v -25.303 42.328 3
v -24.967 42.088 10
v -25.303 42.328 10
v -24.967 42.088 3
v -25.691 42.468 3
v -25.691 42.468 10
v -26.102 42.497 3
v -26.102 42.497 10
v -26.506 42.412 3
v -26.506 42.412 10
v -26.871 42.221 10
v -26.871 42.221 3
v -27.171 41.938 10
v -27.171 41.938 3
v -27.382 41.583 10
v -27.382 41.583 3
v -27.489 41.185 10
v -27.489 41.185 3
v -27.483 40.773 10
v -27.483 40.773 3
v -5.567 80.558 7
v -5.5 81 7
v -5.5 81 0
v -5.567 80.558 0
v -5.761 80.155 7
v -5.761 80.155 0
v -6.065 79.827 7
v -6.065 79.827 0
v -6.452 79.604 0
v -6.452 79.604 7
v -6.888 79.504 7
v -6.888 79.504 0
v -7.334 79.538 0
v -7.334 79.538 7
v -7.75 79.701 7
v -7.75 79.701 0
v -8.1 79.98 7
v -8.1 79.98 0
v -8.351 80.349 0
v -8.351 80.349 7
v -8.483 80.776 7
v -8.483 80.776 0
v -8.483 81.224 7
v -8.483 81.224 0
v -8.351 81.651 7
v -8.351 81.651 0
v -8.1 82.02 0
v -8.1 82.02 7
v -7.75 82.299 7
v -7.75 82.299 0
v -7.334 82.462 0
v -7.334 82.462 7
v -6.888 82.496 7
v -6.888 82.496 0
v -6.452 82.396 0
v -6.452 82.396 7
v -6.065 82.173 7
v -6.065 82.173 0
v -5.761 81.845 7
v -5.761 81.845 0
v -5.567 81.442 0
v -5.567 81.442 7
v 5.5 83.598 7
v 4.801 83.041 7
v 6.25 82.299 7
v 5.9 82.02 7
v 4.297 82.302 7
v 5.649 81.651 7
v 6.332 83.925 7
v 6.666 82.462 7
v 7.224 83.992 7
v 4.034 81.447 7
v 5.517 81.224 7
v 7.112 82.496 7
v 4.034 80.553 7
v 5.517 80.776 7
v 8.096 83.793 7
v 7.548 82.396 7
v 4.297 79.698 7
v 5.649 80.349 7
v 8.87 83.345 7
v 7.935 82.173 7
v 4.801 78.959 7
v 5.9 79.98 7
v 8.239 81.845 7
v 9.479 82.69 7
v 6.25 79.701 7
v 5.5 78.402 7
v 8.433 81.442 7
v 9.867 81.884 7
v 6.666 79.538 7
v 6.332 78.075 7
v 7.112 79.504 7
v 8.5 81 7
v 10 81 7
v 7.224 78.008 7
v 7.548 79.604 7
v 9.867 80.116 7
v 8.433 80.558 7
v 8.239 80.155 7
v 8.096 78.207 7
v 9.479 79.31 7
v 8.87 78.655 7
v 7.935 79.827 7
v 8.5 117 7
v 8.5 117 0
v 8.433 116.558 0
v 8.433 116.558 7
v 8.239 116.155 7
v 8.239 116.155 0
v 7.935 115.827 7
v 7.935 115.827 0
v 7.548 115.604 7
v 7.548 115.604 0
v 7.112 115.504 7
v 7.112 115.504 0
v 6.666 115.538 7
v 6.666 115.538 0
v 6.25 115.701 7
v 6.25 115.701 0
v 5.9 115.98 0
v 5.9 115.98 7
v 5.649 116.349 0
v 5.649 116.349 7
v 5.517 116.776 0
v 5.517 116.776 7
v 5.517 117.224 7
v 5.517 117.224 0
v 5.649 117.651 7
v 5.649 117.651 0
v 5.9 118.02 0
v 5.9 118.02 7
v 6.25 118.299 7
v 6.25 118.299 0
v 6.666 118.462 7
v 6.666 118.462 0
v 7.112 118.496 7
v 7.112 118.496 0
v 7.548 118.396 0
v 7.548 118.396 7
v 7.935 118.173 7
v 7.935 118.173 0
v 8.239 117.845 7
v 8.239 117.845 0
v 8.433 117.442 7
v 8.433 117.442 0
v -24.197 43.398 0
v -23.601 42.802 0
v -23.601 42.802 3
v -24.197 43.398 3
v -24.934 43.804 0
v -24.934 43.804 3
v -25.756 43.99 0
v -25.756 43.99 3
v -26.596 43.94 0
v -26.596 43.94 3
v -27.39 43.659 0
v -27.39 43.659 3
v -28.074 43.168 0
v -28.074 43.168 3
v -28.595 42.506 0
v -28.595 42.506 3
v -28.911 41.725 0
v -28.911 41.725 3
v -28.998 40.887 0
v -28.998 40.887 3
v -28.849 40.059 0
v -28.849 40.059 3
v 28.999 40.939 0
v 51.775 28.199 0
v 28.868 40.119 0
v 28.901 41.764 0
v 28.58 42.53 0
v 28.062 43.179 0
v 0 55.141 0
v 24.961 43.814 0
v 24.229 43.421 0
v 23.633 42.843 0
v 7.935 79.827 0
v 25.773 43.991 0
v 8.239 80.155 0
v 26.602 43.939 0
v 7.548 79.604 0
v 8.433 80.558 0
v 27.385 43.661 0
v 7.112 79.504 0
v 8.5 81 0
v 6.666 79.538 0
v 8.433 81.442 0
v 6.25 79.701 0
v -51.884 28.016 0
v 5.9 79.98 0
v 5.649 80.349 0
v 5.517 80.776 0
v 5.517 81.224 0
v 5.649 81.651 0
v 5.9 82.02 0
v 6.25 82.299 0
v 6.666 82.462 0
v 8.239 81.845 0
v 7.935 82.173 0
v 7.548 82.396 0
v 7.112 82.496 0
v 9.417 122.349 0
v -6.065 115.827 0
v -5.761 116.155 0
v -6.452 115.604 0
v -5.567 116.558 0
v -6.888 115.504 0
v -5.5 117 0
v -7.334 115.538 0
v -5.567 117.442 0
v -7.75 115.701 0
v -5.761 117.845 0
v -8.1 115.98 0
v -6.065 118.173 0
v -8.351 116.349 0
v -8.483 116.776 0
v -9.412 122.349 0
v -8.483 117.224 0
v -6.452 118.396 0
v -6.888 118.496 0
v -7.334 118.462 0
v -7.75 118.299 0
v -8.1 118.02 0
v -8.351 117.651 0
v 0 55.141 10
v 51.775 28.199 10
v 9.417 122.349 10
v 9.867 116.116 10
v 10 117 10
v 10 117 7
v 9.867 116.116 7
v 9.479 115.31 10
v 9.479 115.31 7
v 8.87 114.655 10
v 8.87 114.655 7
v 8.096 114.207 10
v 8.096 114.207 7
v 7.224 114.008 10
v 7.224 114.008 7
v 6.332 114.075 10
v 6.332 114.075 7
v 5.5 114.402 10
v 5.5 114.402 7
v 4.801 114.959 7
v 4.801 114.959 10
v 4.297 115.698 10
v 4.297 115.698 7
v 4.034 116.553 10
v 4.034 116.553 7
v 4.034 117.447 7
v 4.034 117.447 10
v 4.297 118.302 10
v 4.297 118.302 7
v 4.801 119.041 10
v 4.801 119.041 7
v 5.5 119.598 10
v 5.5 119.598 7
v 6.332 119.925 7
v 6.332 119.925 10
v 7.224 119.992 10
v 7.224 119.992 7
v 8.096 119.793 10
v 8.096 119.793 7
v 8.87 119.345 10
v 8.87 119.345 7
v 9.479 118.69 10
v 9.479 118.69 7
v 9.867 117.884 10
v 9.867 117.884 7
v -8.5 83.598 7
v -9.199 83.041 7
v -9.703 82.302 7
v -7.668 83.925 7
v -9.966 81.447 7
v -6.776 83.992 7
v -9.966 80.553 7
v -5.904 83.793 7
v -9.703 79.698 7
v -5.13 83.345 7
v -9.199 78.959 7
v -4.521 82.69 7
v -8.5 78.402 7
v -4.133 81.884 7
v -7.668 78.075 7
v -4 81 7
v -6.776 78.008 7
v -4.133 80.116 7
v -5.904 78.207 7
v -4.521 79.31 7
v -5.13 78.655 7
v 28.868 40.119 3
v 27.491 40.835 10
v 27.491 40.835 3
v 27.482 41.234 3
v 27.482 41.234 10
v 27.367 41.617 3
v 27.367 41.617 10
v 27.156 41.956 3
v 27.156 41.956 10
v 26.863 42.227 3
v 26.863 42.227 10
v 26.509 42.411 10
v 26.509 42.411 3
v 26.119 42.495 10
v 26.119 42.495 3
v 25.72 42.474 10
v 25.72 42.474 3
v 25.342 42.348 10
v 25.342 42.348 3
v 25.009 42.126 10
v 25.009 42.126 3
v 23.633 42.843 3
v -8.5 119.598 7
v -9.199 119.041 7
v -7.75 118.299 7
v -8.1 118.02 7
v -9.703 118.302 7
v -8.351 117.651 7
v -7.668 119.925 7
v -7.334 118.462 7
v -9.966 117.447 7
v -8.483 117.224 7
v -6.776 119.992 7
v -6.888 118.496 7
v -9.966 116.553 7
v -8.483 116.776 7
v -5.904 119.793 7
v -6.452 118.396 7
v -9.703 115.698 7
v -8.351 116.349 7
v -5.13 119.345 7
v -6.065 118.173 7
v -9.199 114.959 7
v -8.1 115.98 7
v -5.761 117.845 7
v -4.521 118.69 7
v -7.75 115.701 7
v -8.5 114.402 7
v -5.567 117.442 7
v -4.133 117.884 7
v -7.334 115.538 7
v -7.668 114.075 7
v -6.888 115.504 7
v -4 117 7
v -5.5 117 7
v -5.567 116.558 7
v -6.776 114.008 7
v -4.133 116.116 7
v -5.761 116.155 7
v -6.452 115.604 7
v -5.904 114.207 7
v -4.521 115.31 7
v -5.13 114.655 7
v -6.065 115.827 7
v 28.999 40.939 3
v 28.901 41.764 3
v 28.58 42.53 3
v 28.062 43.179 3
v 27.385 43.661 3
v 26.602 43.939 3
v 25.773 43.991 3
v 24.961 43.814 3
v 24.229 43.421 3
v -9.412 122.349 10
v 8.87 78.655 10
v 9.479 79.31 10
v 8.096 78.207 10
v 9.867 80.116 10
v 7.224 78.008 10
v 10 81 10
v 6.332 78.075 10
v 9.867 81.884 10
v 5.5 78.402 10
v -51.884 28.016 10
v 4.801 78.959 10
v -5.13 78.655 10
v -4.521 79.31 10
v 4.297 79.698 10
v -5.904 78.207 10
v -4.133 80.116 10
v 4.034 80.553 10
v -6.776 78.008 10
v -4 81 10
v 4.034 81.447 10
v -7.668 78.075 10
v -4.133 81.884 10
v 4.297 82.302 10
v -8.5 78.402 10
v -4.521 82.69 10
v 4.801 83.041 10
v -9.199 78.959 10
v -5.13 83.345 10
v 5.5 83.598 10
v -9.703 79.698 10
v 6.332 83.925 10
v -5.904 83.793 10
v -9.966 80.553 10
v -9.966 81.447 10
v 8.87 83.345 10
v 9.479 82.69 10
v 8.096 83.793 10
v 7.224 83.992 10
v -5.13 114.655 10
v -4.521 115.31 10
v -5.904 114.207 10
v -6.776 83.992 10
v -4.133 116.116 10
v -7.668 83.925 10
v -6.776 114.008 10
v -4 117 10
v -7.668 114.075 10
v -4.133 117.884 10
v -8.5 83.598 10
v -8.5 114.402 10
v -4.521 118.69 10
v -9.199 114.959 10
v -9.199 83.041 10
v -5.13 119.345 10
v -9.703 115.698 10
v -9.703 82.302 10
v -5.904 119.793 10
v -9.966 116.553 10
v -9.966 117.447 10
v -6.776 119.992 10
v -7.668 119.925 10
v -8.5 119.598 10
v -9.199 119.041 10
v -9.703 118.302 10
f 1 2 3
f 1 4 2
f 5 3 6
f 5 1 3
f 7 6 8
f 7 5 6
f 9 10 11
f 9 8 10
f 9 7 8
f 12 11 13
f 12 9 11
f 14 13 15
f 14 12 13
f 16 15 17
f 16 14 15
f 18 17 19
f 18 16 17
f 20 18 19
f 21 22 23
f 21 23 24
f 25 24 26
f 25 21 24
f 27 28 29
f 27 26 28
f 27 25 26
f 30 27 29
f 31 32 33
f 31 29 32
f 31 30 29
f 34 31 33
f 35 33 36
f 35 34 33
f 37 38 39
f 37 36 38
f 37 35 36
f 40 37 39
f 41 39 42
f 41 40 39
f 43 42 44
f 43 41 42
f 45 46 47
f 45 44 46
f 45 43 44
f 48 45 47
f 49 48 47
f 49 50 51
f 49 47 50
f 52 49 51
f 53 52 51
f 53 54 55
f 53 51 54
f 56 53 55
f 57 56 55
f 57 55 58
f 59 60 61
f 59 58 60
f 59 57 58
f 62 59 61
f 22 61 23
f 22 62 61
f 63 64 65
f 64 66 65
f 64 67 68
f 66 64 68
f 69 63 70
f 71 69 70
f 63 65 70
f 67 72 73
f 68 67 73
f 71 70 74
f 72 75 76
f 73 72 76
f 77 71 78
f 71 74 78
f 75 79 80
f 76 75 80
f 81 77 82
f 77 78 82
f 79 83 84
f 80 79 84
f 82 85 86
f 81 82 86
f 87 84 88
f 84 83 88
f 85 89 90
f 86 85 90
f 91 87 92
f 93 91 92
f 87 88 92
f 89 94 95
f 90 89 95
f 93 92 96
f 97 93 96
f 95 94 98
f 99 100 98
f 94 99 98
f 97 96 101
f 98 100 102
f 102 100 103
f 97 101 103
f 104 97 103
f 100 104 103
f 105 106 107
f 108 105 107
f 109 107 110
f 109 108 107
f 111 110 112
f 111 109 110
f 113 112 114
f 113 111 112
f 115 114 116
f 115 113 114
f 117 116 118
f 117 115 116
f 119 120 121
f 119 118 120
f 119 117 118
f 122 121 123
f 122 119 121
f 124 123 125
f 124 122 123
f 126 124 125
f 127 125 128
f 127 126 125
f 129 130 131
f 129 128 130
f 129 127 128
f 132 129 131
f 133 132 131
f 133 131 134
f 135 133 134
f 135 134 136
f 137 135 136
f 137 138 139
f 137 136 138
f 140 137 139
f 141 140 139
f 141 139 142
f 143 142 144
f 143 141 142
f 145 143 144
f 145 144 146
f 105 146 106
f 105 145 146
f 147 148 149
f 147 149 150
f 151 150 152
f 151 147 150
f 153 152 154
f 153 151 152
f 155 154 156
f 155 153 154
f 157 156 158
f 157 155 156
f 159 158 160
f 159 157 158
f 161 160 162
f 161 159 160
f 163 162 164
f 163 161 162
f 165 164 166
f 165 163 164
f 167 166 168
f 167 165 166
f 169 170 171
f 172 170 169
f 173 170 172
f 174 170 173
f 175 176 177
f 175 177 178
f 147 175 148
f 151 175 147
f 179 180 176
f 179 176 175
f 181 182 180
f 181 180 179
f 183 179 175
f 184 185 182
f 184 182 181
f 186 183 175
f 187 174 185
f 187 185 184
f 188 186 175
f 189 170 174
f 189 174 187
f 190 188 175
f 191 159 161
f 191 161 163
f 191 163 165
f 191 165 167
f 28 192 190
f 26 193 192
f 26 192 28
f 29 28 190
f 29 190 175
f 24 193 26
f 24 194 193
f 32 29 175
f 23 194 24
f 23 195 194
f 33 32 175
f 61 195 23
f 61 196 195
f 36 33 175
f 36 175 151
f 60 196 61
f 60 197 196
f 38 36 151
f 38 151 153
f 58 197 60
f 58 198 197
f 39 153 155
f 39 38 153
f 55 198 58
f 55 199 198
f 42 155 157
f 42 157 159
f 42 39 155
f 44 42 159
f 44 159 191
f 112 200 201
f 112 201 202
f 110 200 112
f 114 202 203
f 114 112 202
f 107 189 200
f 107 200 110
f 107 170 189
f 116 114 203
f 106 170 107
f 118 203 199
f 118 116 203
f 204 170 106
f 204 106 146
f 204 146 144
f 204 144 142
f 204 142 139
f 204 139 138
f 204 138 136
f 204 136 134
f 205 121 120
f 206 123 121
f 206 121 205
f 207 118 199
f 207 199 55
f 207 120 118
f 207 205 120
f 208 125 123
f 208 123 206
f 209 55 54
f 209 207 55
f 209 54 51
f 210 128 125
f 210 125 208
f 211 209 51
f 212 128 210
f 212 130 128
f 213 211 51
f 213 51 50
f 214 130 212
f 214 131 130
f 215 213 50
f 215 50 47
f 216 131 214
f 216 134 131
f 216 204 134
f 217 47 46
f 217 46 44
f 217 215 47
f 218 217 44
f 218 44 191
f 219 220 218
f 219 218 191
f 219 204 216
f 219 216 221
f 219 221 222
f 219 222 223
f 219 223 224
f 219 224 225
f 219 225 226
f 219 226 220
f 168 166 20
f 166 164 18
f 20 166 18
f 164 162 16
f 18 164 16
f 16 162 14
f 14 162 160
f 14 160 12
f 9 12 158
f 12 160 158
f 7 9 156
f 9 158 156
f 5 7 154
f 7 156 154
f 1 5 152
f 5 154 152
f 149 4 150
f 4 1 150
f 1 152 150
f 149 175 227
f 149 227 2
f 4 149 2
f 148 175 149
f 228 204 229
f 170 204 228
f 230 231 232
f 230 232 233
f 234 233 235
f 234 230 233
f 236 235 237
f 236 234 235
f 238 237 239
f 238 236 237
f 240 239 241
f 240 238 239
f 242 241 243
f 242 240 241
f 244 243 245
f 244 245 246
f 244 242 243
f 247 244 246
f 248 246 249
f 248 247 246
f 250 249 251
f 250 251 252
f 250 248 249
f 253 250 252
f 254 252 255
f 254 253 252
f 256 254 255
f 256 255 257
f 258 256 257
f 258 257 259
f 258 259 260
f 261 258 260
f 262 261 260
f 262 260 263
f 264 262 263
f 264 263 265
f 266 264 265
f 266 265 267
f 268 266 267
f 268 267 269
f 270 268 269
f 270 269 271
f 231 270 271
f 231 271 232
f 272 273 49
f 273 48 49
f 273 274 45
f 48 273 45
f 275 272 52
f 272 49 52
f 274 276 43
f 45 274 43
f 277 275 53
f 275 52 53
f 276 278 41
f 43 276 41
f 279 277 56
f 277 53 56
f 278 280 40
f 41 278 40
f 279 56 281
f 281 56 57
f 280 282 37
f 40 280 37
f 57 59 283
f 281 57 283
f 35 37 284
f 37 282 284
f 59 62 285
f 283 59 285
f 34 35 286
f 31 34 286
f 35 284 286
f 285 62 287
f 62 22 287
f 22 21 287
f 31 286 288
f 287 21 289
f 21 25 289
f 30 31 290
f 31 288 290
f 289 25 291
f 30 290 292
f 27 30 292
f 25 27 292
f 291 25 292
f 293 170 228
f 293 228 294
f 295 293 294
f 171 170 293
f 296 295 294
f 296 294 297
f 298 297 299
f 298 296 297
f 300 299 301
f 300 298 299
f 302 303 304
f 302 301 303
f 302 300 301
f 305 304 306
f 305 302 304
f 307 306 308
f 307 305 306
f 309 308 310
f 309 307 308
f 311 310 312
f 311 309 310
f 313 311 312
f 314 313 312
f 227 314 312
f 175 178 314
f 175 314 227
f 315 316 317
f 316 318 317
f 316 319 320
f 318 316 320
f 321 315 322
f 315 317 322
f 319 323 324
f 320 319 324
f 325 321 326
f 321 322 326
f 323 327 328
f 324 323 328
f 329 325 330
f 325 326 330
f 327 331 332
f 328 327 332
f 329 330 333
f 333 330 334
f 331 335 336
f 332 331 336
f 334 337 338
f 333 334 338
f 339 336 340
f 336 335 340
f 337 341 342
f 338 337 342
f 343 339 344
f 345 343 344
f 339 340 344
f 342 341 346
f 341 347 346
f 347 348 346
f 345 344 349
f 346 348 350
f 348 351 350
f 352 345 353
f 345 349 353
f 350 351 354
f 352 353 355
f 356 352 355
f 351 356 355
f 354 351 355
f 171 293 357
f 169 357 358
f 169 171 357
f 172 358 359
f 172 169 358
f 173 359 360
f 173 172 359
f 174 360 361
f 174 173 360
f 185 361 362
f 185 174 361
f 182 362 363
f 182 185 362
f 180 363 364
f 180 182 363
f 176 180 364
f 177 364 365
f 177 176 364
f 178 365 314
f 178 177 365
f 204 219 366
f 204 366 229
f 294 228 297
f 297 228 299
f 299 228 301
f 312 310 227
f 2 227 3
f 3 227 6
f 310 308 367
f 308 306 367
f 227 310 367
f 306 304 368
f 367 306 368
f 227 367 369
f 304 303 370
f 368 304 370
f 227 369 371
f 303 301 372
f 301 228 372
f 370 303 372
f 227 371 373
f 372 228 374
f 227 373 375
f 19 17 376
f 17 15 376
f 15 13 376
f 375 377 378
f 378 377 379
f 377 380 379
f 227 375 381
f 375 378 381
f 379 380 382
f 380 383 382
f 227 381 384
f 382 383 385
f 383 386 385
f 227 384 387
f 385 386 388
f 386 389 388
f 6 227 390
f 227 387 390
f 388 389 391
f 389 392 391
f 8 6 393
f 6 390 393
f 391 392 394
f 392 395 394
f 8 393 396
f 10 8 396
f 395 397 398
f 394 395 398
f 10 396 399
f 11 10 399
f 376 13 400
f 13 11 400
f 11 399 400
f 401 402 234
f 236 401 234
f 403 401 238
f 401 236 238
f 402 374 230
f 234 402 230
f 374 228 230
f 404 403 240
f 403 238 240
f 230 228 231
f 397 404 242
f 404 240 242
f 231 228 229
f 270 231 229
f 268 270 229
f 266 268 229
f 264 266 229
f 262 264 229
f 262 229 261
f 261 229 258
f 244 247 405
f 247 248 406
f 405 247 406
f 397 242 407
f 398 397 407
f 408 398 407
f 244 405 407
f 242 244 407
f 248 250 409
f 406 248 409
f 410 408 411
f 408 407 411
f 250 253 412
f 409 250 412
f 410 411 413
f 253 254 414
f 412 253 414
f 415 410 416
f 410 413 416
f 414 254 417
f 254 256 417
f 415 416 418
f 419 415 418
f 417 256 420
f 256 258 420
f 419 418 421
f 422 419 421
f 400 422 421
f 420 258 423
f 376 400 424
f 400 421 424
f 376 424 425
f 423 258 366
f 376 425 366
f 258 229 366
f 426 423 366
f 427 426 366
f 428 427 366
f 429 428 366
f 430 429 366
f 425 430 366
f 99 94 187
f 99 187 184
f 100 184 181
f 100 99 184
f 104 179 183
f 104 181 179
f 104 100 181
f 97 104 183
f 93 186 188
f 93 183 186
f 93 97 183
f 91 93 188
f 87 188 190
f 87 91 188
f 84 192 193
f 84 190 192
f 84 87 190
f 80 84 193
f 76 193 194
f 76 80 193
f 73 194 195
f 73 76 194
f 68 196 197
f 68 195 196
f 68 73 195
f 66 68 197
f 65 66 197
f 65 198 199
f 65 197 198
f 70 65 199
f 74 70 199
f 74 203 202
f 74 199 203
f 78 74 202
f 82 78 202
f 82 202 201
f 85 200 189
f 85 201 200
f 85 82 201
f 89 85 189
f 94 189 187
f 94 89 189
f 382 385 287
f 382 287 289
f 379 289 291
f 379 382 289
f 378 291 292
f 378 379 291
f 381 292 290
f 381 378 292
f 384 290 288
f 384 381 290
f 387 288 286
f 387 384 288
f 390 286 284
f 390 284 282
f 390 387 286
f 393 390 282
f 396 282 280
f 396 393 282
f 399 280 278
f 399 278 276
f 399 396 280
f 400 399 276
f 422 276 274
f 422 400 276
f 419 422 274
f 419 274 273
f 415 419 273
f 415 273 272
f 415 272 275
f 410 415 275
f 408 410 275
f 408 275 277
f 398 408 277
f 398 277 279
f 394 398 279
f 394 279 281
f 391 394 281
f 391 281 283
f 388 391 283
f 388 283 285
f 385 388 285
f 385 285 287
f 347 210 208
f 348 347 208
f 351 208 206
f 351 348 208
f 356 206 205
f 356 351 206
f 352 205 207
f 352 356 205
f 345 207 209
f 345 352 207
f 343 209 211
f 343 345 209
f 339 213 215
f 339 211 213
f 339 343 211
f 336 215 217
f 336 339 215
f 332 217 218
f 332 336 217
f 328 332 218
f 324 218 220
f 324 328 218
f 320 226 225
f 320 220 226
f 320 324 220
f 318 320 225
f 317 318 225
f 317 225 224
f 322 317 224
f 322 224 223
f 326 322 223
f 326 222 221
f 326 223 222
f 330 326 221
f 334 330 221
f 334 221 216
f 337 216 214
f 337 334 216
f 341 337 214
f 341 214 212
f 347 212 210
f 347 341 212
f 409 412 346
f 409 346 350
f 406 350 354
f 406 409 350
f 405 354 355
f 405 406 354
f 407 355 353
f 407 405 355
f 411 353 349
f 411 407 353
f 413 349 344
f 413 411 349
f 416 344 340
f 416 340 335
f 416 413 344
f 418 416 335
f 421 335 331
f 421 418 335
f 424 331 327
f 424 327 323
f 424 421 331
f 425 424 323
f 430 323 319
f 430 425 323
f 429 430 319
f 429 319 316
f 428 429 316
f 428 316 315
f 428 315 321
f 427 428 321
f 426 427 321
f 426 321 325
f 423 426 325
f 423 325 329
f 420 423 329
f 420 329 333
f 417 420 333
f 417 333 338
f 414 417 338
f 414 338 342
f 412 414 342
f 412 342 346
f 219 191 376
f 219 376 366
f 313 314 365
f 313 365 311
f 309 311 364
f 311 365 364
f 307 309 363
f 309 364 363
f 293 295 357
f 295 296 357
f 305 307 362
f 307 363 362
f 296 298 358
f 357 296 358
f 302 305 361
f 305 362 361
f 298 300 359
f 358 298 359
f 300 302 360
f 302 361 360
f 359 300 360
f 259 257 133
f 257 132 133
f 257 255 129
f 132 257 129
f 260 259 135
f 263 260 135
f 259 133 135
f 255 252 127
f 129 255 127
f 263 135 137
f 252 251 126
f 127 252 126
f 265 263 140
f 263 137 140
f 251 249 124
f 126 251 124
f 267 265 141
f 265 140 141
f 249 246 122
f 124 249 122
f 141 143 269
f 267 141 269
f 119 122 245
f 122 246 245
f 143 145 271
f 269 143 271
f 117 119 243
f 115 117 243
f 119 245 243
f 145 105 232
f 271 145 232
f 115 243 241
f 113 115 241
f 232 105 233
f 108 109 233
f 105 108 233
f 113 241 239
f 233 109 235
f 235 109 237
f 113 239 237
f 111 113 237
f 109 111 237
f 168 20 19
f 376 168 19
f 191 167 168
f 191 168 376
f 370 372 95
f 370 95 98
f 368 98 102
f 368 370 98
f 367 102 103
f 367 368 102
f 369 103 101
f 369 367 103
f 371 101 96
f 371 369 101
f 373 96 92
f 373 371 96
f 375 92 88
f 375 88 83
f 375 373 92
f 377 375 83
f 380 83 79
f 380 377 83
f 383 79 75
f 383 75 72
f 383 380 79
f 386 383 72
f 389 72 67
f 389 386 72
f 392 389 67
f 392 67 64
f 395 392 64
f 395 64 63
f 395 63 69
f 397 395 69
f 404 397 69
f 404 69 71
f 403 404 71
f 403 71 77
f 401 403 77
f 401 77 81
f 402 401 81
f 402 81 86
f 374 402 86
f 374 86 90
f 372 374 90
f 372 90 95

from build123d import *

# Parameters (mm, degrees)
CYLINDER1267_R              = 1.5
CYLINDER1267_DEPTH          = 32
CYLINDER1266_R              = 1.5
CYLINDER1266_DEPTH          = 32
CYLINDER1265_R              = 1.5
CYLINDER1265_DEPTH          = 100
CYLINDER1264_R              = 1.5
CYLINDER1264_DEPTH          = 100
CYLINDER1259_R              = 3
CYLINDER1259_DEPTH          = 3
CYLINDER1258_R              = 3
CYLINDER1258_DEPTH          = 3
CYLINDER581_R               = 3
CYLINDER581_DEPTH           = 4
CYLINDER582_R               = 3
CYLINDER582_DEPTH           = 4
CYLINDER580_R               = 3
CYLINDER580_DEPTH           = 4
CYLINDER575_R               = 3
CYLINDER575_DEPTH           = 4
COMPOUND338_PLACEMENT_ANGLE = 90
CYLINDER576_R               = 1.5
CYLINDER576_DEPTH           = 20
CYLINDER578_R               = 1.5
CYLINDER578_DEPTH           = 20
CYLINDER579_R               = 1.5
CYLINDER579_DEPTH           = 20
CYLINDER577_R               = 1.5
CYLINDER577_DEPTH           = 20
COMPOUND337_PLACEMENT_ANGLE = 90
PAD001_DEPTH                = 10


with BuildPart() as v_lec1267:
    # Cylinder1267 → Cylinder1267 (new body)
    with BuildSketch(Plane(origin=(78, 41, -42), x_dir=(1, 0, 0), z_dir=(0, 0, 1))):
        Circle(CYLINDER1267_R)
    extrude(amount=CYLINDER1267_DEPTH)


with BuildPart() as compound649:
    # Cylinder1266 → Cylinder1266 (new body)
    with BuildSketch(Plane(origin=(26, 41, -42), x_dir=(1, 0, 0), z_dir=(0, 0, 1))):
        Circle(CYLINDER1266_R)
    extrude(amount=CYLINDER1266_DEPTH)

    # Compound649: union Válec1267
    add(v_lec1267.part)


with BuildPart() as compound649_1:
    # Compound649 placement: moved
    add(compound649.part.moved(Location((-52, 0, 36))))


with BuildPart() as v_lec1265:
    # Cylinder1265 → Cylinder1265 (new body)
    with BuildSketch(Plane(origin=(14, 0, -60), x_dir=(1, 0, 0), z_dir=(0, 0, 1))):
        Circle(CYLINDER1265_R)
    extrude(amount=CYLINDER1265_DEPTH)


with BuildPart() as compound647:
    # Cylinder1264 → Cylinder1264 (new body)
    with BuildSketch(Plane(origin=(90, 0, -60), x_dir=(1, 0, 0), z_dir=(0, 0, 1))):
        Circle(CYLINDER1264_R)
    extrude(amount=CYLINDER1264_DEPTH)

    # Compound648: union Válec1265
    add(v_lec1265.part)


with BuildPart() as compound647_1:
    # Compound648 placement: moved
    add(compound647.part.moved(Location((-52, 0, 0))))

    # Compound647: union Compound649
    add(compound649_1.part)


with BuildPart() as v_lec1259:
    # Cylinder1259 → Cylinder1259 (new body)
    with BuildSketch(Plane(origin=(78, 41, -42), x_dir=(1, 0, 0), z_dir=(0, 0, 1))):
        Circle(CYLINDER1259_R)
    extrude(amount=CYLINDER1259_DEPTH)


with BuildPart() as compound642:
    # Cylinder1258 → Cylinder1258 (new body)
    with BuildSketch(Plane(origin=(26, 41, -42), x_dir=(1, 0, 0), z_dir=(0, 0, 1))):
        Circle(CYLINDER1258_R)
    extrude(amount=CYLINDER1258_DEPTH)

    # Compound642: union Válec1259
    add(v_lec1259.part)


with BuildPart() as compound642_1:
    # Compound642 placement: moved
    add(compound642.part.moved(Location((-52, 0, 42))))


with BuildPart() as v_lec581:
    # Cylinder581 → Cylinder581 (new body)
    with BuildSketch(Plane(origin=(-7, -34, 37), x_dir=(1, 0, 0), z_dir=(0, -1, 0))):
        Circle(CYLINDER581_R)
    extrude(amount=CYLINDER581_DEPTH)


with BuildPart() as v_lec582:
    # Cylinder582 → Cylinder582 (new body)
    with BuildSketch(Plane(origin=(7, -34, 73), x_dir=(1, 0, 0), z_dir=(0, -1, 0))):
        Circle(CYLINDER582_R)
    extrude(amount=CYLINDER582_DEPTH)


with BuildPart() as v_lec580:
    # Cylinder580 → Cylinder580 (new body)
    with BuildSketch(Plane(origin=(-7, -34, 73), x_dir=(1, 0, 0), z_dir=(0, -1, 0))):
        Circle(CYLINDER580_R)
    extrude(amount=CYLINDER580_DEPTH)


with BuildPart() as compound338:
    # Cylinder575 → Cylinder575 (new body)
    with BuildSketch(Plane(origin=(7, -34, 37), x_dir=(1, 0, 0), z_dir=(0, -1, 0))):
        Circle(CYLINDER575_R)
    extrude(amount=CYLINDER575_DEPTH)

    # Compound338: union Válec581, Válec582, Válec580
    add(v_lec581.part)
    add(v_lec582.part)
    add(v_lec580.part)


with BuildPart() as compound338_1:
    # Compound338 placement: moved
    add(compound338.part.moved(Location((0, 154, 45))).rotate(Axis((0, 154, 45), (1, 0, 0)), COMPOUND338_PLACEMENT_ANGLE))


with BuildPart() as v_lec576:
    # Cylinder576 → Cylinder576 (new body)
    with BuildSketch(Plane(origin=(-7, -34, 37), x_dir=(1, 0, 0), z_dir=(0, -1, 0))):
        Circle(CYLINDER576_R)
    extrude(amount=CYLINDER576_DEPTH)


with BuildPart() as v_lec578:
    # Cylinder578 → Cylinder578 (new body)
    with BuildSketch(Plane(origin=(7, -34, 73), x_dir=(1, 0, 0), z_dir=(0, -1, 0))):
        Circle(CYLINDER578_R)
    extrude(amount=CYLINDER578_DEPTH)


with BuildPart() as v_lec579:
    # Cylinder579 → Cylinder579 (new body)
    with BuildSketch(Plane(origin=(-7, -34, 73), x_dir=(1, 0, 0), z_dir=(0, -1, 0))):
        Circle(CYLINDER579_R)
    extrude(amount=CYLINDER579_DEPTH)


with BuildPart() as compound337:
    # Cylinder577 → Cylinder577 (new body)
    with BuildSketch(Plane(origin=(7, -34, 37), x_dir=(1, 0, 0), z_dir=(0, -1, 0))):
        Circle(CYLINDER577_R)
    extrude(amount=CYLINDER577_DEPTH)

    # Compound337: union Válec576, Válec578, Válec579
    add(v_lec576.part)
    add(v_lec578.part)
    add(v_lec579.part)


with BuildPart() as compound337_1:
    # Compound337 placement: moved
    add(compound337.part.moved(Location((0, 154, 45))).rotate(Axis((0, 154, 45), (1, 0, 0)), COMPOUND337_PLACEMENT_ANGLE))


with BuildPart() as cut204:
    # Sketch001 → Pad001 (new body)
    with BuildSketch(Plane.XY):
        Polygon((-51.883896, 28.015725), (-9.412477, 122.34876), (9.417463, 122.34876), (51.774643, 28.198511), (0, 55.140807), align=None)
    extrude(amount=PAD001_DEPTH)

    # Cut192: cut Compound337
    add(compound337_1.part, mode=Mode.SUBTRACT)

    # Cut193: cut Compound338
    add(compound338_1.part, mode=Mode.SUBTRACT)

    # Cut197: cut Compound642
    add(compound642_1.part, mode=Mode.SUBTRACT)

    # Cut204: cut Compound647
    add(compound647_1.part, mode=Mode.SUBTRACT)


solid = cut204.part
